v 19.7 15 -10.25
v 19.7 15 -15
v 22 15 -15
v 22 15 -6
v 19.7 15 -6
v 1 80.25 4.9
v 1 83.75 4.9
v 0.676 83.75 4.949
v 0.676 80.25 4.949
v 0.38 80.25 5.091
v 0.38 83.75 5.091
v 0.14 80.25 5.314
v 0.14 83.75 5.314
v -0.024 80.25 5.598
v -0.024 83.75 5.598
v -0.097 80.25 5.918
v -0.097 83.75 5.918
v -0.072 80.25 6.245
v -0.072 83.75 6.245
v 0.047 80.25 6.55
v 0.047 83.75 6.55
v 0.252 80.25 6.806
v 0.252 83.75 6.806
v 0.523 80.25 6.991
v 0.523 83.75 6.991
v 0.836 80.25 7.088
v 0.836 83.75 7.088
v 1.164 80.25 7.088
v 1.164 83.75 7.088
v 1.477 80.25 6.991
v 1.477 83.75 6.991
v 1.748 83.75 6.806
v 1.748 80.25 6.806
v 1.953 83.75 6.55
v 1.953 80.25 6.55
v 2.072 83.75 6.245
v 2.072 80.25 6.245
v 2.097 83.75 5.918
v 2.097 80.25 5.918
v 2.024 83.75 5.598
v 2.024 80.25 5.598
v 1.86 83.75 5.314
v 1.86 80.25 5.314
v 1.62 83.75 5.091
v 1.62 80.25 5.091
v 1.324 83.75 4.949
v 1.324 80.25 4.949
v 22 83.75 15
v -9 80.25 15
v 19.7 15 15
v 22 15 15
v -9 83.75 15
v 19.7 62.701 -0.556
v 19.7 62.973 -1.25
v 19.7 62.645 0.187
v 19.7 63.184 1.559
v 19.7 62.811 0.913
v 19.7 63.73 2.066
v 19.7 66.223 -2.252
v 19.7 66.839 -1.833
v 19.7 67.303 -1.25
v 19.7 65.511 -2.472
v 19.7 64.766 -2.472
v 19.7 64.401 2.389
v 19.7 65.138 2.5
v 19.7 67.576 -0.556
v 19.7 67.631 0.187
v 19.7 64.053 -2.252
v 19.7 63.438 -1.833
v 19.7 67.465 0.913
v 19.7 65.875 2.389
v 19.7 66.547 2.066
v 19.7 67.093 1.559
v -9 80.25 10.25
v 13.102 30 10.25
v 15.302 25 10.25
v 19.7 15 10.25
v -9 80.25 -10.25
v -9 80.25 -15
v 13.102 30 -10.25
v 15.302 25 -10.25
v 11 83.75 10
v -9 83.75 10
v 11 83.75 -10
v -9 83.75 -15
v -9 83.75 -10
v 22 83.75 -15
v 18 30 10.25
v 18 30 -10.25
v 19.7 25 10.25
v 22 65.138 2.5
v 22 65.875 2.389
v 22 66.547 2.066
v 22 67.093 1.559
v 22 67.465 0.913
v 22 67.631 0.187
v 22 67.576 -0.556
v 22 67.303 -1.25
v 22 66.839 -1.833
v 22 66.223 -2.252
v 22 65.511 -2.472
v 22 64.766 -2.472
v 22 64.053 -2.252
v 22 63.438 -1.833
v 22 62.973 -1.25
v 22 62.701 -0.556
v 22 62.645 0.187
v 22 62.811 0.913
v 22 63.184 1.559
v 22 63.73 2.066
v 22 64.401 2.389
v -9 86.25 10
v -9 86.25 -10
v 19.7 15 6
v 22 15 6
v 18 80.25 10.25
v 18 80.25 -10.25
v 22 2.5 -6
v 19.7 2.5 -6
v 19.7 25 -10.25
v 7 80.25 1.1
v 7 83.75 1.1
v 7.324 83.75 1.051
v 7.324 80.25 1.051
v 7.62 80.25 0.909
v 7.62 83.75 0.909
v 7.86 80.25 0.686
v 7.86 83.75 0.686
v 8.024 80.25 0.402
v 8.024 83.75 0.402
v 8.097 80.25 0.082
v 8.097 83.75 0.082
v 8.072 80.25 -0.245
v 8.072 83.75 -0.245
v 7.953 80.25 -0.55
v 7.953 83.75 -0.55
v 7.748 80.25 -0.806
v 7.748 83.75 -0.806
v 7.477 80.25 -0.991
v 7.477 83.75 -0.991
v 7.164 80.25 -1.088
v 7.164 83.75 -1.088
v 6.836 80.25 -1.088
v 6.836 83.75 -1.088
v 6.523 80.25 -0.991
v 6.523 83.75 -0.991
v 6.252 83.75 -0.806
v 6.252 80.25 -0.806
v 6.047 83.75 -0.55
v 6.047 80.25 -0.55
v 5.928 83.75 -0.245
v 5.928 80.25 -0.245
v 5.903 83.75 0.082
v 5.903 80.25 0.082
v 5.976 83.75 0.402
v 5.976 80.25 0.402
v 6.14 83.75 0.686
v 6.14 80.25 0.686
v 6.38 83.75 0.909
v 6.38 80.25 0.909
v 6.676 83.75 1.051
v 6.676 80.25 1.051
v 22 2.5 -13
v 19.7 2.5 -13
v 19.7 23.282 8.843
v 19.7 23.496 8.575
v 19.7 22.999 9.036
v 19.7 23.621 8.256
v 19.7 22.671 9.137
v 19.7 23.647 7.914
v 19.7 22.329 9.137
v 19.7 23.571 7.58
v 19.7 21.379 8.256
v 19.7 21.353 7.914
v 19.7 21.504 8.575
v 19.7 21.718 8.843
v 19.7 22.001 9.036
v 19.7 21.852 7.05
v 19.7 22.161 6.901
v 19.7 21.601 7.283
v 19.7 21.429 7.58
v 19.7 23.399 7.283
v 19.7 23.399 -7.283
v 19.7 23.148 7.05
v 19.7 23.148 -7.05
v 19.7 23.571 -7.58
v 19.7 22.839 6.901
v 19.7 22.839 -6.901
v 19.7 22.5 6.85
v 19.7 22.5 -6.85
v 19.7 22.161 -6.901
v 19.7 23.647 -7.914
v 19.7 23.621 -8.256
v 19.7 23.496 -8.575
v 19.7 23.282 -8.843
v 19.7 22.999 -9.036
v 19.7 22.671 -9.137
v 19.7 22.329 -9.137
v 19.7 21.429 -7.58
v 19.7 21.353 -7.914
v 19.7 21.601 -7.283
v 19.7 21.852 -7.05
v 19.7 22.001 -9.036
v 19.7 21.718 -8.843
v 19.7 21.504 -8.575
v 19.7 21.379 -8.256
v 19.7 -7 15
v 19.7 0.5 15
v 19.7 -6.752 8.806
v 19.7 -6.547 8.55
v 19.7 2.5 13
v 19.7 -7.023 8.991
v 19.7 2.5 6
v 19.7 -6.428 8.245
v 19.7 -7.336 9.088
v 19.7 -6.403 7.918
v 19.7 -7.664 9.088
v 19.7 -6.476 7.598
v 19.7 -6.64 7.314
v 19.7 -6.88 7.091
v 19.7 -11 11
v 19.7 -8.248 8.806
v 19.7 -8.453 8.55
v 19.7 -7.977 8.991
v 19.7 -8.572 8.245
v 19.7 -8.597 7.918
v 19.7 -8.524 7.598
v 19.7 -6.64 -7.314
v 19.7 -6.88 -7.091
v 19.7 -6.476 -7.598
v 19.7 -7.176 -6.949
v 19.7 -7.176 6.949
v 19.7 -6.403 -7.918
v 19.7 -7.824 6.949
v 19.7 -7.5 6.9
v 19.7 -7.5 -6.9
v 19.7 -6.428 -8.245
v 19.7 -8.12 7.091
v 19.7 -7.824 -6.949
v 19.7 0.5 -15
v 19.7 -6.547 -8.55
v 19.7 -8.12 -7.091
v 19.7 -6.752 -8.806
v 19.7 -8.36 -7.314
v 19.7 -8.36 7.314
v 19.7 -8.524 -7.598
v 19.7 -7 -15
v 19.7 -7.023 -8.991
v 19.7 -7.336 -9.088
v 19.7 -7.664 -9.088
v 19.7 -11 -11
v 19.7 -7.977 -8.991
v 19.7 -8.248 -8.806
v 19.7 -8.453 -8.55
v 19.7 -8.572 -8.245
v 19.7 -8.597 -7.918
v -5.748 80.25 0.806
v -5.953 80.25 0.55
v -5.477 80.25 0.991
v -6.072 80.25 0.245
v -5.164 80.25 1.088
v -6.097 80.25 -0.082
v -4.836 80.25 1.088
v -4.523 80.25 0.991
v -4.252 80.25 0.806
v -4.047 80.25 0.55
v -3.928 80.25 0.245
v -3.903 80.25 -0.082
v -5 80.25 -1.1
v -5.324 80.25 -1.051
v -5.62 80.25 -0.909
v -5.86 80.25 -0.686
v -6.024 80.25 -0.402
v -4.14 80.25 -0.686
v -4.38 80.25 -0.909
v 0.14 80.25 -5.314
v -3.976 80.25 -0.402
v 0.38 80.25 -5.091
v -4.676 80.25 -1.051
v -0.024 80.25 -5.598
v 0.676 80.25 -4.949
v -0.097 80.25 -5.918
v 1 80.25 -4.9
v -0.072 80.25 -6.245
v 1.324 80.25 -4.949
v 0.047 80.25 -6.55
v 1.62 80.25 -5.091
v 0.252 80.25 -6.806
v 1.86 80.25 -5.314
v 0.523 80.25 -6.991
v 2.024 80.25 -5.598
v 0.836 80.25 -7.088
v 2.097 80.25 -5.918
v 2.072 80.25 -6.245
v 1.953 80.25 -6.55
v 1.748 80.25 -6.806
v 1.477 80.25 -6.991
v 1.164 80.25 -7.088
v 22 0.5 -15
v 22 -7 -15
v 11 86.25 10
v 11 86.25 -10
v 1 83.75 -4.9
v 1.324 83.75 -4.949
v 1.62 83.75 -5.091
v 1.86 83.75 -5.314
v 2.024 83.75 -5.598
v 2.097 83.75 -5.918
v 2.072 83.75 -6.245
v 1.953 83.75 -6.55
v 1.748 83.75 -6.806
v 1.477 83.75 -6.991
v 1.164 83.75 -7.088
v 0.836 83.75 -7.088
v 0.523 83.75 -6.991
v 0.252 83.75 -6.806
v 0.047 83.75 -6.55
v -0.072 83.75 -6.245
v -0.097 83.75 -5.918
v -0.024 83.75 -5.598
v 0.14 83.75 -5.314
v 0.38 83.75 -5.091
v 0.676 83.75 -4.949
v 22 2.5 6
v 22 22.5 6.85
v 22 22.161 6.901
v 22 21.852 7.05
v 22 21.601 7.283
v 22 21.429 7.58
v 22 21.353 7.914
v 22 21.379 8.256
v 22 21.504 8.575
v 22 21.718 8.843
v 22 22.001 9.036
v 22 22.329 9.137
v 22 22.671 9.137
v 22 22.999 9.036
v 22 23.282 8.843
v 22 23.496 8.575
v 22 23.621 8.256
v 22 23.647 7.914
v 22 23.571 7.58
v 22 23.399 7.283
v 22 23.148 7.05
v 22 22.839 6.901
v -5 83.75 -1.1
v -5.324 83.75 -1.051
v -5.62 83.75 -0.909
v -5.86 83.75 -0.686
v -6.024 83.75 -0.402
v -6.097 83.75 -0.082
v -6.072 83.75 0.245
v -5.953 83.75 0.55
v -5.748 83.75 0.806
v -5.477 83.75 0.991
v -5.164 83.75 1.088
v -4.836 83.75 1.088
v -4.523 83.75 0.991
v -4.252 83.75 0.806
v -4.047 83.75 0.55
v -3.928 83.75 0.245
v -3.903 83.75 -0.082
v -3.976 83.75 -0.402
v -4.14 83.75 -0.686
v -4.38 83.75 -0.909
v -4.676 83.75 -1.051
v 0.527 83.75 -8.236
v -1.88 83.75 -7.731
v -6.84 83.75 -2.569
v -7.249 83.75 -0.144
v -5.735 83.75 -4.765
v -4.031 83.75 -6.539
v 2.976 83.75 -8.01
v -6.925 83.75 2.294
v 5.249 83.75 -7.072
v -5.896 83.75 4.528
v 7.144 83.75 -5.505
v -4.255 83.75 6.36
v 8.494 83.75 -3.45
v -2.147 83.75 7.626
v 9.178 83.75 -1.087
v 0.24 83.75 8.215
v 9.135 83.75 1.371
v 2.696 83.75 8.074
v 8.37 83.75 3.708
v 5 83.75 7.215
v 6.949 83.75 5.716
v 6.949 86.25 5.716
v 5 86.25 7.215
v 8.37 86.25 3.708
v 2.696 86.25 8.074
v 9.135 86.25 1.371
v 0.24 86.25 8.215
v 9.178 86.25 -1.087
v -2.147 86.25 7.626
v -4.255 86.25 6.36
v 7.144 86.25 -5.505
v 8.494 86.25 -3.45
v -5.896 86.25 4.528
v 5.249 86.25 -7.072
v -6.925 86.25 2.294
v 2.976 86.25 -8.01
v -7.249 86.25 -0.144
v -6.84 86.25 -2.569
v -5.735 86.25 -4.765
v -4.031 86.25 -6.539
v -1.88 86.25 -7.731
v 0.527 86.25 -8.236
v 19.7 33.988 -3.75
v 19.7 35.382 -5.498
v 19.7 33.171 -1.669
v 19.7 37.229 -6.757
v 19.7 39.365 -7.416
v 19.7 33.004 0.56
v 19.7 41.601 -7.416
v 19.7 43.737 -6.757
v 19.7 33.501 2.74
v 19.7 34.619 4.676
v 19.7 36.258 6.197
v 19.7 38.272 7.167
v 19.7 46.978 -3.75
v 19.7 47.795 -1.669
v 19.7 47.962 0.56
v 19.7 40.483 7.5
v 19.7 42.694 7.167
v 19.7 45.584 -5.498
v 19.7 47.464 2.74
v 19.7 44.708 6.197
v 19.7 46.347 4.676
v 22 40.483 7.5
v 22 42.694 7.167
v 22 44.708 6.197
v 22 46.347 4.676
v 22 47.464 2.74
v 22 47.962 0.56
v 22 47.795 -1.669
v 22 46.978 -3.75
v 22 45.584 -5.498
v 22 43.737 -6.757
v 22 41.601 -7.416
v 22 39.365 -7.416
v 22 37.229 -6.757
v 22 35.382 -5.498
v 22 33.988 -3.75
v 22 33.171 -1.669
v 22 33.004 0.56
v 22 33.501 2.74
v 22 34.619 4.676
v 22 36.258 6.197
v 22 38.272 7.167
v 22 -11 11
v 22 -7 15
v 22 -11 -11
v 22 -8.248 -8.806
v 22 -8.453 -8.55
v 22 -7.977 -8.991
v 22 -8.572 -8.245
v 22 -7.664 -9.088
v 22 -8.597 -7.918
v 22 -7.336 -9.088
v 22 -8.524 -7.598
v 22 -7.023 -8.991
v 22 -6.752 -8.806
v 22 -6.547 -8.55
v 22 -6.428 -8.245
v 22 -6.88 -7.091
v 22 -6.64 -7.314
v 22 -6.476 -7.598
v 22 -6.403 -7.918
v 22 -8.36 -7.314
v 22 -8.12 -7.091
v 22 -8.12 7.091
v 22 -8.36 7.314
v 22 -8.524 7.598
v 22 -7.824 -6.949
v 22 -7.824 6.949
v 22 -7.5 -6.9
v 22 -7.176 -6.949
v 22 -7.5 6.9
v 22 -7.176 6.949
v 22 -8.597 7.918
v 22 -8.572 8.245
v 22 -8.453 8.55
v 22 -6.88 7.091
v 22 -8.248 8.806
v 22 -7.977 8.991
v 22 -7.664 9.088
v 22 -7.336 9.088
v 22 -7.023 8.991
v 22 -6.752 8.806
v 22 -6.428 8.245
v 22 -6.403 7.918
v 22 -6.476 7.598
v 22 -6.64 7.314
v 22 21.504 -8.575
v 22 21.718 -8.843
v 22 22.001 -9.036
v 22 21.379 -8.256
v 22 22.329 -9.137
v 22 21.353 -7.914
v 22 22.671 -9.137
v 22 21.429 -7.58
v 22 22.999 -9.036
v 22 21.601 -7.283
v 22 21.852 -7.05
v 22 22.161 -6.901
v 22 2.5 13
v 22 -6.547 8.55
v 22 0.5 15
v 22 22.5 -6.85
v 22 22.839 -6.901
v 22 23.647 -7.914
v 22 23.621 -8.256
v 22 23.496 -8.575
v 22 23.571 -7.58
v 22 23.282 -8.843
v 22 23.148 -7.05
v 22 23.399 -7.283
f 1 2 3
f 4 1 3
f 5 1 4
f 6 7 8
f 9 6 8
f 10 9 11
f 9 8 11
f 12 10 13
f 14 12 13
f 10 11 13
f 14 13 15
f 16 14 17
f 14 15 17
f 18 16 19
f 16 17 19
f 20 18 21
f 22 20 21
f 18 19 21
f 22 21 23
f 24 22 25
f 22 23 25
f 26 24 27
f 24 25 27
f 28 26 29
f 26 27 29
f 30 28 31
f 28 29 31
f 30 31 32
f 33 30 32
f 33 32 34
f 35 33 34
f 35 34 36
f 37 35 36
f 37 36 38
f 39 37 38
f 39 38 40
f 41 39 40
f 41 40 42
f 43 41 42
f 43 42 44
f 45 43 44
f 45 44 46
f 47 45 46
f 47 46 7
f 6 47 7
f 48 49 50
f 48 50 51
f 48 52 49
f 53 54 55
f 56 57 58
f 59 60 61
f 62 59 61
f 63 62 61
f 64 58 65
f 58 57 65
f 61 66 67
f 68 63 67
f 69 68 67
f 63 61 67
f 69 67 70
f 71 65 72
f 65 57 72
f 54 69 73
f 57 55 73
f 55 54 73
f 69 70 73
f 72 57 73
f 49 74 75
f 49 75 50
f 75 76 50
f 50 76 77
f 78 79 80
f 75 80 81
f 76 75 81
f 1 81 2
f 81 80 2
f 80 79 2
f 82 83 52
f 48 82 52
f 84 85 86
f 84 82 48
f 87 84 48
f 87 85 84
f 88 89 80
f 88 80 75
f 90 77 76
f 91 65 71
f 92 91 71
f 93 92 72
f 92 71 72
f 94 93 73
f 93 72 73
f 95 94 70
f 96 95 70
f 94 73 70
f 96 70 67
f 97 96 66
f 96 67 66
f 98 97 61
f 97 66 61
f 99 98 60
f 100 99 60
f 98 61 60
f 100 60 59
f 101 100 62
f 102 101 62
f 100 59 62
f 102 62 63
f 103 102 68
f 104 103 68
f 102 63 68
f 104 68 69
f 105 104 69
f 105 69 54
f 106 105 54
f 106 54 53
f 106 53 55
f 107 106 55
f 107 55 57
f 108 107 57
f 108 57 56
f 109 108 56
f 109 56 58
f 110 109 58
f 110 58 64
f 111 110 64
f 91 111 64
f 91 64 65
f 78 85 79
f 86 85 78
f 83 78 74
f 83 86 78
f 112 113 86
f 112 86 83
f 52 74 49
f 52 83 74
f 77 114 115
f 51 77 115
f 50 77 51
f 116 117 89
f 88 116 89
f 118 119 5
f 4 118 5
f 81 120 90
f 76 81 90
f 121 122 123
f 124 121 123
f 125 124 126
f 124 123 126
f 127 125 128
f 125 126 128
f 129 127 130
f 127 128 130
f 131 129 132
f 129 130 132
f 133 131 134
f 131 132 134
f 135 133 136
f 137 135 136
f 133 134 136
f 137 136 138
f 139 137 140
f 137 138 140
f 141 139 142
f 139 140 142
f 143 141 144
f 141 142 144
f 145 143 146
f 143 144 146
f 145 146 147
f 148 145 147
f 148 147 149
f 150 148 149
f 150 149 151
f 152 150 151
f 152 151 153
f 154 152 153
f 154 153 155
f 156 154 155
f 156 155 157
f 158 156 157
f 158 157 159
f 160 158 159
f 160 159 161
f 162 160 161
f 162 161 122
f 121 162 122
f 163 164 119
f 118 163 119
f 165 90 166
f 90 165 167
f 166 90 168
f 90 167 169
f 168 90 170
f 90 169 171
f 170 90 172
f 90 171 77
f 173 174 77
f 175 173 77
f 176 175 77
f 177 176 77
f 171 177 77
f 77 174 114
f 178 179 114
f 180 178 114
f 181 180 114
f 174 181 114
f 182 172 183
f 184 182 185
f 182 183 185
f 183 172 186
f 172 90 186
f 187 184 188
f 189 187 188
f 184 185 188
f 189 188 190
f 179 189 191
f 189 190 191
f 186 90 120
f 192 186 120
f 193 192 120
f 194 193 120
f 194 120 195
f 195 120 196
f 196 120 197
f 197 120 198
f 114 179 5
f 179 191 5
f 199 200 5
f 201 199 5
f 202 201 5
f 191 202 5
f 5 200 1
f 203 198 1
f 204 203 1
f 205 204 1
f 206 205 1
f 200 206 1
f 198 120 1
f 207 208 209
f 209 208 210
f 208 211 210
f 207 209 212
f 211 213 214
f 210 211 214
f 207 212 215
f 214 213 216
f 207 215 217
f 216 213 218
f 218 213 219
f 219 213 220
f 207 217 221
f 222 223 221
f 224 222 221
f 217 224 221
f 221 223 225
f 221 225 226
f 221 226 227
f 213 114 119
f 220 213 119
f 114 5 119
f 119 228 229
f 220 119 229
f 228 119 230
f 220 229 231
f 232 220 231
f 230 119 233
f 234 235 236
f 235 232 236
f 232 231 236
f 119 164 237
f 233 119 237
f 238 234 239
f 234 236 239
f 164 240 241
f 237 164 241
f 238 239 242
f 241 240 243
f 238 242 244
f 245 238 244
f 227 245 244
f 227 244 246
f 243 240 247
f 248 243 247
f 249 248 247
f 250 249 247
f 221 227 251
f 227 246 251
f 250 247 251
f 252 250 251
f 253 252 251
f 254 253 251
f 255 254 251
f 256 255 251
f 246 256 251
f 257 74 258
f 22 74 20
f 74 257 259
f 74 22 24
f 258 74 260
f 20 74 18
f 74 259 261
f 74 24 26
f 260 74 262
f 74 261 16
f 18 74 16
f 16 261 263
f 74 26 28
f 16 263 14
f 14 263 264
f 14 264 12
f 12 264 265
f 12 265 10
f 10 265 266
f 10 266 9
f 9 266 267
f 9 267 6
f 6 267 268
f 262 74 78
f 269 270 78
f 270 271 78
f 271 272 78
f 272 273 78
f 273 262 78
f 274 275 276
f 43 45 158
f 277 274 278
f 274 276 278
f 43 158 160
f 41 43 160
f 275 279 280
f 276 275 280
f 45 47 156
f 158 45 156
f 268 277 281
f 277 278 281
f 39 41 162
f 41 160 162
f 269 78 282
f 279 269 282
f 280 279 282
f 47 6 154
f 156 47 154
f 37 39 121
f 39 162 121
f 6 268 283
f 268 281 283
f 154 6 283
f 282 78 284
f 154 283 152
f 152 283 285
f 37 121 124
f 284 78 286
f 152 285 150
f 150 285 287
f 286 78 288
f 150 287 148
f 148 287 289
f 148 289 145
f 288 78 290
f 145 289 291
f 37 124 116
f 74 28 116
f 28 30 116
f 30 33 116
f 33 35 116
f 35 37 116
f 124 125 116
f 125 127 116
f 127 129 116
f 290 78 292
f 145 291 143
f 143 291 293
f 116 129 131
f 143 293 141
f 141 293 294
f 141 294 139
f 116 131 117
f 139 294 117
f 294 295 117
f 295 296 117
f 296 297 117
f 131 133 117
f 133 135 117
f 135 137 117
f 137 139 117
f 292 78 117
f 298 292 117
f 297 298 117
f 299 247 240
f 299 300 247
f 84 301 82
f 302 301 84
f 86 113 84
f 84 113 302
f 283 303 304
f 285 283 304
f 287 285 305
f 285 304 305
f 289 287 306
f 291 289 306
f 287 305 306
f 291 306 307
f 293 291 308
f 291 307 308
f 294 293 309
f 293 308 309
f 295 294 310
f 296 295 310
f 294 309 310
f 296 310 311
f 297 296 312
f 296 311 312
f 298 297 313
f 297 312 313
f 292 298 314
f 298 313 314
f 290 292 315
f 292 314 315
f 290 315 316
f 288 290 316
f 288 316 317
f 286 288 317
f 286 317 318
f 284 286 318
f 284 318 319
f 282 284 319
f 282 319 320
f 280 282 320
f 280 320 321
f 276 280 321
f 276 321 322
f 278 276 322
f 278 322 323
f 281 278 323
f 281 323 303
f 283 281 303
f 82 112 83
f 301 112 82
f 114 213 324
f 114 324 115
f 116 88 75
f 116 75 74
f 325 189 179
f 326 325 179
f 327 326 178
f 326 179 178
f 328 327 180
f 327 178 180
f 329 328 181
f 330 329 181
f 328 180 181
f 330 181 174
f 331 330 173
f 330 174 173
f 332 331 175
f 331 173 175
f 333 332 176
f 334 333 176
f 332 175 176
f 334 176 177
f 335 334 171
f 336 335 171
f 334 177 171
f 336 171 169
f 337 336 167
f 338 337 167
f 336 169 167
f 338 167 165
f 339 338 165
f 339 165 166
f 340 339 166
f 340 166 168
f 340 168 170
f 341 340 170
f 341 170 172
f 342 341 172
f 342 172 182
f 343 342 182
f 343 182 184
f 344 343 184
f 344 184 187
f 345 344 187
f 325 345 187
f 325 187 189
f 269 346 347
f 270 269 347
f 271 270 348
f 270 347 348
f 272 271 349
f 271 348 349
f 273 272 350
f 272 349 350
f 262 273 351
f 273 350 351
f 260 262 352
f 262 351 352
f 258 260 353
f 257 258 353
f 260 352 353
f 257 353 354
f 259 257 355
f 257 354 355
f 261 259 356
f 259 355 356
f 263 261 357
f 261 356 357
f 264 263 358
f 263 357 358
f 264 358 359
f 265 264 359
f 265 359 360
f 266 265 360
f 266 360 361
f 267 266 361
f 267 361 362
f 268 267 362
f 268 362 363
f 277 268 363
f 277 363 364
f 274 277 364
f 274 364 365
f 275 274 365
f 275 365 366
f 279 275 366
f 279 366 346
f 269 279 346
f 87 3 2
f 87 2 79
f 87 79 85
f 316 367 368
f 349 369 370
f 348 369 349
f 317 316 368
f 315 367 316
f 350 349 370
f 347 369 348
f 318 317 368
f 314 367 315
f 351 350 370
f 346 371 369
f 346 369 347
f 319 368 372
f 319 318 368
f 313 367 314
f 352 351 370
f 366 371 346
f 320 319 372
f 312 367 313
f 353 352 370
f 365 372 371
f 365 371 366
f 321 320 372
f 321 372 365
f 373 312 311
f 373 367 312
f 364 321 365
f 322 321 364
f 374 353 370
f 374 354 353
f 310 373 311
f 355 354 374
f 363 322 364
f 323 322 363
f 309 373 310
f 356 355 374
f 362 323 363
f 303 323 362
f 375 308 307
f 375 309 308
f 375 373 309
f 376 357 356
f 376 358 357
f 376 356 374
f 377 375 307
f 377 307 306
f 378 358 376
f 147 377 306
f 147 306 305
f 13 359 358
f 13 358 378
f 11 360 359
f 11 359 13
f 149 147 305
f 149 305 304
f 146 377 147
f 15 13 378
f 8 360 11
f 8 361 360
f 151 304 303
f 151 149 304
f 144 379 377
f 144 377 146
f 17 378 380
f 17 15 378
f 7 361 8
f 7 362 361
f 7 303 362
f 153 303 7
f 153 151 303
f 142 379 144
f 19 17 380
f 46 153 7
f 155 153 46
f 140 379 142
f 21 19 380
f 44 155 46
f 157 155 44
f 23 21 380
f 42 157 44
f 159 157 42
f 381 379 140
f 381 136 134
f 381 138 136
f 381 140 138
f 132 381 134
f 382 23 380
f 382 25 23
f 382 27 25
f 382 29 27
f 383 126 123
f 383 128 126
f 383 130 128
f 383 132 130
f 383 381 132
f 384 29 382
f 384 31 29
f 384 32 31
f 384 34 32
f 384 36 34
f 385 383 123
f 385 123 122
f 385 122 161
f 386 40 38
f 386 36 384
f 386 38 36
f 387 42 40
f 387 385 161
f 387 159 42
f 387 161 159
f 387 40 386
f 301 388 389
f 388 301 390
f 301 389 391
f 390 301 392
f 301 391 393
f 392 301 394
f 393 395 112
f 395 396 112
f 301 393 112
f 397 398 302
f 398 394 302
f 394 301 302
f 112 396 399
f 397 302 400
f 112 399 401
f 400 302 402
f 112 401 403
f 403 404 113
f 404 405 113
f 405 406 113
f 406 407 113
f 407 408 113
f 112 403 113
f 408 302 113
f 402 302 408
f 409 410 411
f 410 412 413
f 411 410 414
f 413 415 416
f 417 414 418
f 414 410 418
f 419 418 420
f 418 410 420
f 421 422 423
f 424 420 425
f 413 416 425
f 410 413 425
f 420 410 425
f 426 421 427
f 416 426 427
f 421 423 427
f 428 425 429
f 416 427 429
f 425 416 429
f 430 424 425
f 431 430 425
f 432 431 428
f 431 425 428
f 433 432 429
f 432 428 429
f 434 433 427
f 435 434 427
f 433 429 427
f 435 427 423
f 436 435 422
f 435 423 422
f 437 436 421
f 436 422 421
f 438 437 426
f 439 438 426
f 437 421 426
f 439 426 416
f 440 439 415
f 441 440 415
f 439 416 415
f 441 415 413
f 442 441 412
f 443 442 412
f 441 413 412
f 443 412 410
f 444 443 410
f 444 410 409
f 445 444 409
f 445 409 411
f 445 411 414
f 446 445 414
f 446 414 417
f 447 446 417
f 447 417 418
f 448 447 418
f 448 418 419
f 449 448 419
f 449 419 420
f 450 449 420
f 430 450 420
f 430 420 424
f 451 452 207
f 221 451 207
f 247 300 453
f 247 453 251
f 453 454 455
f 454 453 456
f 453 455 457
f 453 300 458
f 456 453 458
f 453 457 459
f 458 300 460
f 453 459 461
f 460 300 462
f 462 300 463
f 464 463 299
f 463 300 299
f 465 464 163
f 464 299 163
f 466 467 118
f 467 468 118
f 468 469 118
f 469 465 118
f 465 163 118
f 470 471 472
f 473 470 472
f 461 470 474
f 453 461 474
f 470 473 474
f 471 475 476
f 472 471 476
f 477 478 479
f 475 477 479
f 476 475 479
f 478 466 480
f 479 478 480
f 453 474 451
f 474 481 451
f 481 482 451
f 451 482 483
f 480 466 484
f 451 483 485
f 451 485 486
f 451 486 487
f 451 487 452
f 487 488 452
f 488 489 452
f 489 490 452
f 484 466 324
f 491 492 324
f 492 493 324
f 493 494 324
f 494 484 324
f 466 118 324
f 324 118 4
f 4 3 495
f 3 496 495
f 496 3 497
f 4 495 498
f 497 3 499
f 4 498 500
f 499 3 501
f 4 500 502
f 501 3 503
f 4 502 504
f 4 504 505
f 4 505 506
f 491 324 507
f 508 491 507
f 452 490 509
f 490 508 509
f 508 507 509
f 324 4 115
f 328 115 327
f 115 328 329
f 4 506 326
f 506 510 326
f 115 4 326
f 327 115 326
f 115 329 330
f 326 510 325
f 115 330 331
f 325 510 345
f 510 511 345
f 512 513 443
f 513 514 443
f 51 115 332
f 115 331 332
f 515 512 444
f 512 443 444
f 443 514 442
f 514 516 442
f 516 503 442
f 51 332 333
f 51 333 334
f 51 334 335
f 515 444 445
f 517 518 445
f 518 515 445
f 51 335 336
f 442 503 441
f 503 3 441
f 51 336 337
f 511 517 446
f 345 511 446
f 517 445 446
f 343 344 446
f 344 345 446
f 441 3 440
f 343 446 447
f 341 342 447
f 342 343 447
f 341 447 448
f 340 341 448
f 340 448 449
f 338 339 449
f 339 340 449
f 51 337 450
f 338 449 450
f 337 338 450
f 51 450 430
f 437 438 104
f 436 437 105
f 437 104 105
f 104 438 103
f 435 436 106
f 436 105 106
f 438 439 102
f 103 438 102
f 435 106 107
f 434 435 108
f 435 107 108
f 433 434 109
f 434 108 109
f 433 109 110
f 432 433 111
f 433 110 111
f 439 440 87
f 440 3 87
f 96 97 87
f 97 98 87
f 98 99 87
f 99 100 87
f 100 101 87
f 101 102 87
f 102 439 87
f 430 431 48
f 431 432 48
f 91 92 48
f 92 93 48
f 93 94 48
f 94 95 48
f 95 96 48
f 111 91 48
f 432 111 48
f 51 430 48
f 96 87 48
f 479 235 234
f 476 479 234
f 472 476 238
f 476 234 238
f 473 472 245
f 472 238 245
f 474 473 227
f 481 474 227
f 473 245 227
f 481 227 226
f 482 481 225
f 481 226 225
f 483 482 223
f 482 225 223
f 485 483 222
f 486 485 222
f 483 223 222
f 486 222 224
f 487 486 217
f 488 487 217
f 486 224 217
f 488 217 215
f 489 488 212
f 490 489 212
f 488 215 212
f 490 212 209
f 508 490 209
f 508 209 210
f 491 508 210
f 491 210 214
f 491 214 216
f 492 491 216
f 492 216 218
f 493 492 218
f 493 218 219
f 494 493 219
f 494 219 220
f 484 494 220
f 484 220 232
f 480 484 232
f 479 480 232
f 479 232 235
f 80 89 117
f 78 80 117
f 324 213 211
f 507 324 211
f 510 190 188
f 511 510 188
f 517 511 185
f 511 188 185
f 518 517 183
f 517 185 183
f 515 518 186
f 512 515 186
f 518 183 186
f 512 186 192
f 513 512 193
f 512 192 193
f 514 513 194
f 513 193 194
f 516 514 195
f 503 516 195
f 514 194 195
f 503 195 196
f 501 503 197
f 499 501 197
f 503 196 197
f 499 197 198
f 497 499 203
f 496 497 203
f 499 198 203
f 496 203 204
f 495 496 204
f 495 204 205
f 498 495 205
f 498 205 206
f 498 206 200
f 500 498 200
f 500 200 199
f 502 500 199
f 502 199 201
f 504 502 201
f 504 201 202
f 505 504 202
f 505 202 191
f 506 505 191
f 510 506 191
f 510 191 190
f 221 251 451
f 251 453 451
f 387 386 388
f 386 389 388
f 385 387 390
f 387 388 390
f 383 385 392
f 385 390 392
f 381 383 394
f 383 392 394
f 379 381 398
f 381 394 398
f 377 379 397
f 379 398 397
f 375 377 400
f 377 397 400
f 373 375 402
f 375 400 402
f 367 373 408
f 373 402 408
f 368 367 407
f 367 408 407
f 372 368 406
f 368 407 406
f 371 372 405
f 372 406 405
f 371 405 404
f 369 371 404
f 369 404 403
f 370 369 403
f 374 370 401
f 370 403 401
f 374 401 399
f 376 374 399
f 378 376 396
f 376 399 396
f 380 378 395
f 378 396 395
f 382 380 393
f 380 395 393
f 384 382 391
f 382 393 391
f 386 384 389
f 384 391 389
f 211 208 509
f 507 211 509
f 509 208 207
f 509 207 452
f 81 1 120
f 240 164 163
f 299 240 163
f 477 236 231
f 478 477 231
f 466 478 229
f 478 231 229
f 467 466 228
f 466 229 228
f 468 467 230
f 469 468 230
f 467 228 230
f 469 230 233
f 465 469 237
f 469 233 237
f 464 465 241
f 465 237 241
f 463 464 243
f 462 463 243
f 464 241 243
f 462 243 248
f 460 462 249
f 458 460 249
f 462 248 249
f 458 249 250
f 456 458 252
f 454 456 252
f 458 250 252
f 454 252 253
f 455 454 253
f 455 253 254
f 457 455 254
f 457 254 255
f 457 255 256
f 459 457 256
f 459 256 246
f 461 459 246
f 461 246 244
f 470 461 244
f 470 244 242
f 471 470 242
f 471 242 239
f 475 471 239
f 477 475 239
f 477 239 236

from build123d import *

# Parameters (mm, degrees)
SKETCH_1_W            = 30
SKETCH_1_H            = 30
EXTRUDE_1_DEPTH       = 86.25
SKETCH_2_R            = 8.25
CUT_EXTRUDE_1_DEPTH   = 2.5
SKETCH_3_W            = 10
SKETCH_3_H            = 66.25
SKETCH_3_H_2          = 20
CUT_EXTRUDE_2_DEPTH   = 93.542220094
SKETCH_4_W            = 10
SKETCH_4_H            = 20
EXTRUDE_2_DEPTH       = 30
SKETCH_5_W            = 7
SKETCH_5_H            = 86.25
EXTRUDE_3_DEPTH       = 30
SKETCH_6_W            = 27
SKETCH_6_H            = 30
EXTRUDE_4_DEPTH       = 11
SKETCH_7_W            = 20.5
SKETCH_7_H            = 36
CUT_EXTRUDE_3_DEPTH   = 24.7
SKETCH_8_R            = 1.1
SKETCH_8_R_2          = 1.15
CUT_EXTRUDE_4_DEPTH   = 23
SKETCH_9_R            = 8.25
CUT_EXTRUDE_5_DEPTH   = 2.5
SKETCH_10_R           = 1.1
CUT_EXTRUDE_6_DEPTH   = 10
CUT_EXTRUDE_7_DEPTH   = 94.931158302
SKETCH_12_W           = 4.75
SKETCH_12_H           = 91.25
EXTRUDE_5_DEPTH       = 28.7
SKETCH_14_W           = 20.5
SKETCH_14_H           = 5
EXTRUDE_6_DEPTH       = 28.7
CUT_EXTRUDE_9_DEPTH   = 94.931158302
CHAMFER_1_SIZE        = 4
SKETCH_15_R           = 7.5
SKETCH_15_R_2         = 2.5
CUT_EXTRUDE_10_DEPTH  = 93.128999235
SKETCH_16_W           = 9
SKETCH_16_H           = 12.5
CUT_EXTRUDE_11_DEPTH  = 10
CHAMFER_2_SIZE        = 2
SKETCH_18_OUTSIDE_W   = 54.278
SKETCH_18_OUTSIDE_H   = 53.278
SKETCH_18_OUTSIDE_W_2 = 20
SKETCH_18_OUTSIDE_H_2 = 20
CUT_EXTRUDE_12_DEPTH  = 2.5


with BuildPart() as part:
    # 草图1 → 凸台-拉伸1 (new body)
    with BuildSketch(Plane(origin=(0, 0, 0), x_dir=(1, 0, 0), z_dir=(0, 1, 0))):
        Rectangle(SKETCH_1_W, SKETCH_1_H)
    extrude(amount=EXTRUDE_1_DEPTH)

    # 草图2 → 切除-拉伸1 (cut)
    with BuildSketch(Plane(origin=(0, 86.25, 0), x_dir=(1, 0, 0), z_dir=(0, 1, 0))):
        with Locations(Location((1, 0, 0), (0, 0, 270))):
            Circle(SKETCH_2_R)
    extrude(amount=-CUT_EXTRUDE_1_DEPTH, mode=Mode.SUBTRACT)

    # 草图3 → 切除-拉伸2 (cut, through all)
    with BuildSketch(Plane(origin=(0, 0, -15), x_dir=(-1, 0, 0), z_dir=(0, 0, -1))):
        with Locations((10, 33.125)):
            Rectangle(SKETCH_3_W, SKETCH_3_H)
        with Locations((-10, 76.25)):
            Rectangle(SKETCH_3_W, SKETCH_3_H_2)
    extrude(amount=-CUT_EXTRUDE_2_DEPTH, mode=Mode.SUBTRACT)

    # 草图4 → 凸台-拉伸2 (add, through all)
    with BuildSketch(Plane(origin=(0, 0, -15), x_dir=(-1, 0, 0), z_dir=(0, 0, -1))):
        with Locations((-10, 76.25)):
            Rectangle(SKETCH_4_W, SKETCH_4_H)
    extrude(amount=-EXTRUDE_2_DEPTH)

    # 草图5 → 凸台-拉伸3 (add, through all)
    with BuildSketch(Plane(origin=(0, 0, -15), x_dir=(-1, 0, 0), z_dir=(0, 0, -1))):
        with Locations((-18.5, 43.125)):
            Rectangle(SKETCH_5_W, SKETCH_5_H)
    extrude(amount=-EXTRUDE_3_DEPTH)

    # 草图6 → 凸台-拉伸4 (add)
    with BuildSketch(Plane.XZ):
        with Locations((8.5, 0)):
            Rectangle(SKETCH_6_W, SKETCH_6_H)
    extrude(amount=EXTRUDE_4_DEPTH)

    # 草图7 → 切除-拉伸3 (cut)
    with BuildSketch(Plane.ZY.offset(5)):
        with Locations((0, 7)):
            Rectangle(SKETCH_7_W, SKETCH_7_H)
    extrude(amount=-CUT_EXTRUDE_3_DEPTH, mode=Mode.SUBTRACT)

    # 草图8 → 切除-拉伸4 (cut)
    with BuildSketch(Plane.ZY.offset(-19.7)):
        with Locations((-8, -7.5)):
            Circle(SKETCH_8_R)
        with Locations((-8, 22.5)):
            Circle(SKETCH_8_R_2)
        with Locations(Location((8, 22.5, 0), (0, 0, 180))):
            Circle(SKETCH_8_R_2)
        with Locations(Location((8, -7.5, 0), (0, 0, 180))):
            Circle(SKETCH_8_R)
    extrude(amount=-CUT_EXTRUDE_4_DEPTH, mode=Mode.SUBTRACT)

    # 草图9 → 切除-拉伸5 (cut)
    with BuildSketch(Plane(origin=(0, 86.25, 0), x_dir=(1, 0, 0), z_dir=(0, 1, 0))):
        with Locations(Location((1, 0, 0), (0, 0, 270))):
            Circle(SKETCH_9_R)
    extrude(amount=-CUT_EXTRUDE_5_DEPTH, mode=Mode.SUBTRACT)

    # 草图10 → 切除-拉伸6 (cut)
    with BuildSketch(Plane(origin=(0, 83.75, 0), x_dir=(1, 0, 0), z_dir=(0, 1, 0))):
        with Locations(Location((1, 6, 0), (0, 0, 270))):
            Circle(SKETCH_10_R)
        with Locations(Location((7, 0, 0), (0, 0, 270))):
            Circle(SKETCH_10_R)
        with Locations(Location((1, -6, 0), (0, 0, 90))):
            Circle(SKETCH_10_R)
        with Locations(Location((-5, 0, 0), (0, 0, 90))):
            Circle(SKETCH_10_R)
    extrude(amount=-CUT_EXTRUDE_6_DEPTH, mode=Mode.SUBTRACT)

    # 草图11 → 切除-拉伸7 (cut, through all)
    with BuildSketch(Plane(origin=(0, 0, -15), x_dir=(-1, 0, 0), z_dir=(0, 0, -1))):
        Polygon((9, 86.25), (9, 80.25), (-18, 80.25), (-18, -11), (15, -11), (15, 86.25), align=None)
    extrude(amount=-CUT_EXTRUDE_7_DEPTH, mode=Mode.SUBTRACT)

    # 草图12 → 凸台-拉伸5 (add, through all)
    with BuildSketch(Plane.ZY.offset(-19.7)):
        with Locations((-12.625, 34.625)):
            Rectangle(SKETCH_12_W, SKETCH_12_H)
        with Locations((12.625, 34.625)):
            Rectangle(SKETCH_12_W, SKETCH_12_H)
    extrude(amount=EXTRUDE_5_DEPTH)

    # 草图14 → 凸台-拉伸6 (add, through all)
    with BuildSketch(Plane.ZY.offset(-19.7)):
        with Locations((0, 27.5)):
            Rectangle(SKETCH_14_W, SKETCH_14_H)
    extrude(amount=EXTRUDE_6_DEPTH)

    # 草图13 → 切除-拉伸9 (cut, through all)
    with BuildSketch(Plane(origin=(0, 0, -15), x_dir=(-1, 0, 0), z_dir=(0, 0, -1))):
        Polygon((9, 80.25), (-19.7, 15), (-19.7, -11), (9, -11), align=None)
    extrude(amount=-CUT_EXTRUDE_9_DEPTH, mode=Mode.SUBTRACT)

    # 倒角1
    chamfer_1_edges = [part.edges().sort_by_distance(p)[0] for p in [
        (20.85, -11, -15),
        (20.85, -11, 15),
    ]]
    chamfer(chamfer_1_edges, length=CHAMFER_1_SIZE)

    # 草图15 → 切除-拉伸10 (cut, through all)
    with BuildSketch(Plane.ZY.offset(-19.7)):
        with Locations((0, 40.482891964)):
            Circle(SKETCH_15_R)
        with Locations((0, 65.138202804)):
            Circle(SKETCH_15_R_2)
    extrude(amount=-CUT_EXTRUDE_10_DEPTH, mode=Mode.SUBTRACT)

    # 草图16 → 切除-拉伸11 (cut)
    with BuildSketch(Plane.ZY.offset(-19.7)):
        with Locations((10.5, 8.75)):
            Rectangle(SKETCH_16_W, SKETCH_16_H)
        with Locations((-10.5, 8.75)):
            Rectangle(SKETCH_16_W, SKETCH_16_H)
    extrude(amount=-CUT_EXTRUDE_11_DEPTH, mode=Mode.SUBTRACT)

    # 倒角2
    chamfer_2_edges = [part.edges().sort_by_distance(p)[0] for p in [
        (20.85, 2.5, -15),
        (20.85, 2.5, 15),
    ]]
    chamfer(chamfer_2_edges, length=CHAMFER_2_SIZE)

    # 草图18 outside → 切除-拉伸12 (cut)
    with BuildSketch(Plane(origin=(0, 86.25, 0), x_dir=(1, 0, 0), z_dir=(0, 1, 0))):
        with Locations((6.5, 0)):
            Rectangle(SKETCH_18_OUTSIDE_W, SKETCH_18_OUTSIDE_H)
        with Locations((1, 0)):
            Rectangle(SKETCH_18_OUTSIDE_W_2, SKETCH_18_OUTSIDE_H_2, mode=Mode.SUBTRACT)
    extrude(amount=-CUT_EXTRUDE_12_DEPTH, mode=Mode.SUBTRACT)


solid = part.part
